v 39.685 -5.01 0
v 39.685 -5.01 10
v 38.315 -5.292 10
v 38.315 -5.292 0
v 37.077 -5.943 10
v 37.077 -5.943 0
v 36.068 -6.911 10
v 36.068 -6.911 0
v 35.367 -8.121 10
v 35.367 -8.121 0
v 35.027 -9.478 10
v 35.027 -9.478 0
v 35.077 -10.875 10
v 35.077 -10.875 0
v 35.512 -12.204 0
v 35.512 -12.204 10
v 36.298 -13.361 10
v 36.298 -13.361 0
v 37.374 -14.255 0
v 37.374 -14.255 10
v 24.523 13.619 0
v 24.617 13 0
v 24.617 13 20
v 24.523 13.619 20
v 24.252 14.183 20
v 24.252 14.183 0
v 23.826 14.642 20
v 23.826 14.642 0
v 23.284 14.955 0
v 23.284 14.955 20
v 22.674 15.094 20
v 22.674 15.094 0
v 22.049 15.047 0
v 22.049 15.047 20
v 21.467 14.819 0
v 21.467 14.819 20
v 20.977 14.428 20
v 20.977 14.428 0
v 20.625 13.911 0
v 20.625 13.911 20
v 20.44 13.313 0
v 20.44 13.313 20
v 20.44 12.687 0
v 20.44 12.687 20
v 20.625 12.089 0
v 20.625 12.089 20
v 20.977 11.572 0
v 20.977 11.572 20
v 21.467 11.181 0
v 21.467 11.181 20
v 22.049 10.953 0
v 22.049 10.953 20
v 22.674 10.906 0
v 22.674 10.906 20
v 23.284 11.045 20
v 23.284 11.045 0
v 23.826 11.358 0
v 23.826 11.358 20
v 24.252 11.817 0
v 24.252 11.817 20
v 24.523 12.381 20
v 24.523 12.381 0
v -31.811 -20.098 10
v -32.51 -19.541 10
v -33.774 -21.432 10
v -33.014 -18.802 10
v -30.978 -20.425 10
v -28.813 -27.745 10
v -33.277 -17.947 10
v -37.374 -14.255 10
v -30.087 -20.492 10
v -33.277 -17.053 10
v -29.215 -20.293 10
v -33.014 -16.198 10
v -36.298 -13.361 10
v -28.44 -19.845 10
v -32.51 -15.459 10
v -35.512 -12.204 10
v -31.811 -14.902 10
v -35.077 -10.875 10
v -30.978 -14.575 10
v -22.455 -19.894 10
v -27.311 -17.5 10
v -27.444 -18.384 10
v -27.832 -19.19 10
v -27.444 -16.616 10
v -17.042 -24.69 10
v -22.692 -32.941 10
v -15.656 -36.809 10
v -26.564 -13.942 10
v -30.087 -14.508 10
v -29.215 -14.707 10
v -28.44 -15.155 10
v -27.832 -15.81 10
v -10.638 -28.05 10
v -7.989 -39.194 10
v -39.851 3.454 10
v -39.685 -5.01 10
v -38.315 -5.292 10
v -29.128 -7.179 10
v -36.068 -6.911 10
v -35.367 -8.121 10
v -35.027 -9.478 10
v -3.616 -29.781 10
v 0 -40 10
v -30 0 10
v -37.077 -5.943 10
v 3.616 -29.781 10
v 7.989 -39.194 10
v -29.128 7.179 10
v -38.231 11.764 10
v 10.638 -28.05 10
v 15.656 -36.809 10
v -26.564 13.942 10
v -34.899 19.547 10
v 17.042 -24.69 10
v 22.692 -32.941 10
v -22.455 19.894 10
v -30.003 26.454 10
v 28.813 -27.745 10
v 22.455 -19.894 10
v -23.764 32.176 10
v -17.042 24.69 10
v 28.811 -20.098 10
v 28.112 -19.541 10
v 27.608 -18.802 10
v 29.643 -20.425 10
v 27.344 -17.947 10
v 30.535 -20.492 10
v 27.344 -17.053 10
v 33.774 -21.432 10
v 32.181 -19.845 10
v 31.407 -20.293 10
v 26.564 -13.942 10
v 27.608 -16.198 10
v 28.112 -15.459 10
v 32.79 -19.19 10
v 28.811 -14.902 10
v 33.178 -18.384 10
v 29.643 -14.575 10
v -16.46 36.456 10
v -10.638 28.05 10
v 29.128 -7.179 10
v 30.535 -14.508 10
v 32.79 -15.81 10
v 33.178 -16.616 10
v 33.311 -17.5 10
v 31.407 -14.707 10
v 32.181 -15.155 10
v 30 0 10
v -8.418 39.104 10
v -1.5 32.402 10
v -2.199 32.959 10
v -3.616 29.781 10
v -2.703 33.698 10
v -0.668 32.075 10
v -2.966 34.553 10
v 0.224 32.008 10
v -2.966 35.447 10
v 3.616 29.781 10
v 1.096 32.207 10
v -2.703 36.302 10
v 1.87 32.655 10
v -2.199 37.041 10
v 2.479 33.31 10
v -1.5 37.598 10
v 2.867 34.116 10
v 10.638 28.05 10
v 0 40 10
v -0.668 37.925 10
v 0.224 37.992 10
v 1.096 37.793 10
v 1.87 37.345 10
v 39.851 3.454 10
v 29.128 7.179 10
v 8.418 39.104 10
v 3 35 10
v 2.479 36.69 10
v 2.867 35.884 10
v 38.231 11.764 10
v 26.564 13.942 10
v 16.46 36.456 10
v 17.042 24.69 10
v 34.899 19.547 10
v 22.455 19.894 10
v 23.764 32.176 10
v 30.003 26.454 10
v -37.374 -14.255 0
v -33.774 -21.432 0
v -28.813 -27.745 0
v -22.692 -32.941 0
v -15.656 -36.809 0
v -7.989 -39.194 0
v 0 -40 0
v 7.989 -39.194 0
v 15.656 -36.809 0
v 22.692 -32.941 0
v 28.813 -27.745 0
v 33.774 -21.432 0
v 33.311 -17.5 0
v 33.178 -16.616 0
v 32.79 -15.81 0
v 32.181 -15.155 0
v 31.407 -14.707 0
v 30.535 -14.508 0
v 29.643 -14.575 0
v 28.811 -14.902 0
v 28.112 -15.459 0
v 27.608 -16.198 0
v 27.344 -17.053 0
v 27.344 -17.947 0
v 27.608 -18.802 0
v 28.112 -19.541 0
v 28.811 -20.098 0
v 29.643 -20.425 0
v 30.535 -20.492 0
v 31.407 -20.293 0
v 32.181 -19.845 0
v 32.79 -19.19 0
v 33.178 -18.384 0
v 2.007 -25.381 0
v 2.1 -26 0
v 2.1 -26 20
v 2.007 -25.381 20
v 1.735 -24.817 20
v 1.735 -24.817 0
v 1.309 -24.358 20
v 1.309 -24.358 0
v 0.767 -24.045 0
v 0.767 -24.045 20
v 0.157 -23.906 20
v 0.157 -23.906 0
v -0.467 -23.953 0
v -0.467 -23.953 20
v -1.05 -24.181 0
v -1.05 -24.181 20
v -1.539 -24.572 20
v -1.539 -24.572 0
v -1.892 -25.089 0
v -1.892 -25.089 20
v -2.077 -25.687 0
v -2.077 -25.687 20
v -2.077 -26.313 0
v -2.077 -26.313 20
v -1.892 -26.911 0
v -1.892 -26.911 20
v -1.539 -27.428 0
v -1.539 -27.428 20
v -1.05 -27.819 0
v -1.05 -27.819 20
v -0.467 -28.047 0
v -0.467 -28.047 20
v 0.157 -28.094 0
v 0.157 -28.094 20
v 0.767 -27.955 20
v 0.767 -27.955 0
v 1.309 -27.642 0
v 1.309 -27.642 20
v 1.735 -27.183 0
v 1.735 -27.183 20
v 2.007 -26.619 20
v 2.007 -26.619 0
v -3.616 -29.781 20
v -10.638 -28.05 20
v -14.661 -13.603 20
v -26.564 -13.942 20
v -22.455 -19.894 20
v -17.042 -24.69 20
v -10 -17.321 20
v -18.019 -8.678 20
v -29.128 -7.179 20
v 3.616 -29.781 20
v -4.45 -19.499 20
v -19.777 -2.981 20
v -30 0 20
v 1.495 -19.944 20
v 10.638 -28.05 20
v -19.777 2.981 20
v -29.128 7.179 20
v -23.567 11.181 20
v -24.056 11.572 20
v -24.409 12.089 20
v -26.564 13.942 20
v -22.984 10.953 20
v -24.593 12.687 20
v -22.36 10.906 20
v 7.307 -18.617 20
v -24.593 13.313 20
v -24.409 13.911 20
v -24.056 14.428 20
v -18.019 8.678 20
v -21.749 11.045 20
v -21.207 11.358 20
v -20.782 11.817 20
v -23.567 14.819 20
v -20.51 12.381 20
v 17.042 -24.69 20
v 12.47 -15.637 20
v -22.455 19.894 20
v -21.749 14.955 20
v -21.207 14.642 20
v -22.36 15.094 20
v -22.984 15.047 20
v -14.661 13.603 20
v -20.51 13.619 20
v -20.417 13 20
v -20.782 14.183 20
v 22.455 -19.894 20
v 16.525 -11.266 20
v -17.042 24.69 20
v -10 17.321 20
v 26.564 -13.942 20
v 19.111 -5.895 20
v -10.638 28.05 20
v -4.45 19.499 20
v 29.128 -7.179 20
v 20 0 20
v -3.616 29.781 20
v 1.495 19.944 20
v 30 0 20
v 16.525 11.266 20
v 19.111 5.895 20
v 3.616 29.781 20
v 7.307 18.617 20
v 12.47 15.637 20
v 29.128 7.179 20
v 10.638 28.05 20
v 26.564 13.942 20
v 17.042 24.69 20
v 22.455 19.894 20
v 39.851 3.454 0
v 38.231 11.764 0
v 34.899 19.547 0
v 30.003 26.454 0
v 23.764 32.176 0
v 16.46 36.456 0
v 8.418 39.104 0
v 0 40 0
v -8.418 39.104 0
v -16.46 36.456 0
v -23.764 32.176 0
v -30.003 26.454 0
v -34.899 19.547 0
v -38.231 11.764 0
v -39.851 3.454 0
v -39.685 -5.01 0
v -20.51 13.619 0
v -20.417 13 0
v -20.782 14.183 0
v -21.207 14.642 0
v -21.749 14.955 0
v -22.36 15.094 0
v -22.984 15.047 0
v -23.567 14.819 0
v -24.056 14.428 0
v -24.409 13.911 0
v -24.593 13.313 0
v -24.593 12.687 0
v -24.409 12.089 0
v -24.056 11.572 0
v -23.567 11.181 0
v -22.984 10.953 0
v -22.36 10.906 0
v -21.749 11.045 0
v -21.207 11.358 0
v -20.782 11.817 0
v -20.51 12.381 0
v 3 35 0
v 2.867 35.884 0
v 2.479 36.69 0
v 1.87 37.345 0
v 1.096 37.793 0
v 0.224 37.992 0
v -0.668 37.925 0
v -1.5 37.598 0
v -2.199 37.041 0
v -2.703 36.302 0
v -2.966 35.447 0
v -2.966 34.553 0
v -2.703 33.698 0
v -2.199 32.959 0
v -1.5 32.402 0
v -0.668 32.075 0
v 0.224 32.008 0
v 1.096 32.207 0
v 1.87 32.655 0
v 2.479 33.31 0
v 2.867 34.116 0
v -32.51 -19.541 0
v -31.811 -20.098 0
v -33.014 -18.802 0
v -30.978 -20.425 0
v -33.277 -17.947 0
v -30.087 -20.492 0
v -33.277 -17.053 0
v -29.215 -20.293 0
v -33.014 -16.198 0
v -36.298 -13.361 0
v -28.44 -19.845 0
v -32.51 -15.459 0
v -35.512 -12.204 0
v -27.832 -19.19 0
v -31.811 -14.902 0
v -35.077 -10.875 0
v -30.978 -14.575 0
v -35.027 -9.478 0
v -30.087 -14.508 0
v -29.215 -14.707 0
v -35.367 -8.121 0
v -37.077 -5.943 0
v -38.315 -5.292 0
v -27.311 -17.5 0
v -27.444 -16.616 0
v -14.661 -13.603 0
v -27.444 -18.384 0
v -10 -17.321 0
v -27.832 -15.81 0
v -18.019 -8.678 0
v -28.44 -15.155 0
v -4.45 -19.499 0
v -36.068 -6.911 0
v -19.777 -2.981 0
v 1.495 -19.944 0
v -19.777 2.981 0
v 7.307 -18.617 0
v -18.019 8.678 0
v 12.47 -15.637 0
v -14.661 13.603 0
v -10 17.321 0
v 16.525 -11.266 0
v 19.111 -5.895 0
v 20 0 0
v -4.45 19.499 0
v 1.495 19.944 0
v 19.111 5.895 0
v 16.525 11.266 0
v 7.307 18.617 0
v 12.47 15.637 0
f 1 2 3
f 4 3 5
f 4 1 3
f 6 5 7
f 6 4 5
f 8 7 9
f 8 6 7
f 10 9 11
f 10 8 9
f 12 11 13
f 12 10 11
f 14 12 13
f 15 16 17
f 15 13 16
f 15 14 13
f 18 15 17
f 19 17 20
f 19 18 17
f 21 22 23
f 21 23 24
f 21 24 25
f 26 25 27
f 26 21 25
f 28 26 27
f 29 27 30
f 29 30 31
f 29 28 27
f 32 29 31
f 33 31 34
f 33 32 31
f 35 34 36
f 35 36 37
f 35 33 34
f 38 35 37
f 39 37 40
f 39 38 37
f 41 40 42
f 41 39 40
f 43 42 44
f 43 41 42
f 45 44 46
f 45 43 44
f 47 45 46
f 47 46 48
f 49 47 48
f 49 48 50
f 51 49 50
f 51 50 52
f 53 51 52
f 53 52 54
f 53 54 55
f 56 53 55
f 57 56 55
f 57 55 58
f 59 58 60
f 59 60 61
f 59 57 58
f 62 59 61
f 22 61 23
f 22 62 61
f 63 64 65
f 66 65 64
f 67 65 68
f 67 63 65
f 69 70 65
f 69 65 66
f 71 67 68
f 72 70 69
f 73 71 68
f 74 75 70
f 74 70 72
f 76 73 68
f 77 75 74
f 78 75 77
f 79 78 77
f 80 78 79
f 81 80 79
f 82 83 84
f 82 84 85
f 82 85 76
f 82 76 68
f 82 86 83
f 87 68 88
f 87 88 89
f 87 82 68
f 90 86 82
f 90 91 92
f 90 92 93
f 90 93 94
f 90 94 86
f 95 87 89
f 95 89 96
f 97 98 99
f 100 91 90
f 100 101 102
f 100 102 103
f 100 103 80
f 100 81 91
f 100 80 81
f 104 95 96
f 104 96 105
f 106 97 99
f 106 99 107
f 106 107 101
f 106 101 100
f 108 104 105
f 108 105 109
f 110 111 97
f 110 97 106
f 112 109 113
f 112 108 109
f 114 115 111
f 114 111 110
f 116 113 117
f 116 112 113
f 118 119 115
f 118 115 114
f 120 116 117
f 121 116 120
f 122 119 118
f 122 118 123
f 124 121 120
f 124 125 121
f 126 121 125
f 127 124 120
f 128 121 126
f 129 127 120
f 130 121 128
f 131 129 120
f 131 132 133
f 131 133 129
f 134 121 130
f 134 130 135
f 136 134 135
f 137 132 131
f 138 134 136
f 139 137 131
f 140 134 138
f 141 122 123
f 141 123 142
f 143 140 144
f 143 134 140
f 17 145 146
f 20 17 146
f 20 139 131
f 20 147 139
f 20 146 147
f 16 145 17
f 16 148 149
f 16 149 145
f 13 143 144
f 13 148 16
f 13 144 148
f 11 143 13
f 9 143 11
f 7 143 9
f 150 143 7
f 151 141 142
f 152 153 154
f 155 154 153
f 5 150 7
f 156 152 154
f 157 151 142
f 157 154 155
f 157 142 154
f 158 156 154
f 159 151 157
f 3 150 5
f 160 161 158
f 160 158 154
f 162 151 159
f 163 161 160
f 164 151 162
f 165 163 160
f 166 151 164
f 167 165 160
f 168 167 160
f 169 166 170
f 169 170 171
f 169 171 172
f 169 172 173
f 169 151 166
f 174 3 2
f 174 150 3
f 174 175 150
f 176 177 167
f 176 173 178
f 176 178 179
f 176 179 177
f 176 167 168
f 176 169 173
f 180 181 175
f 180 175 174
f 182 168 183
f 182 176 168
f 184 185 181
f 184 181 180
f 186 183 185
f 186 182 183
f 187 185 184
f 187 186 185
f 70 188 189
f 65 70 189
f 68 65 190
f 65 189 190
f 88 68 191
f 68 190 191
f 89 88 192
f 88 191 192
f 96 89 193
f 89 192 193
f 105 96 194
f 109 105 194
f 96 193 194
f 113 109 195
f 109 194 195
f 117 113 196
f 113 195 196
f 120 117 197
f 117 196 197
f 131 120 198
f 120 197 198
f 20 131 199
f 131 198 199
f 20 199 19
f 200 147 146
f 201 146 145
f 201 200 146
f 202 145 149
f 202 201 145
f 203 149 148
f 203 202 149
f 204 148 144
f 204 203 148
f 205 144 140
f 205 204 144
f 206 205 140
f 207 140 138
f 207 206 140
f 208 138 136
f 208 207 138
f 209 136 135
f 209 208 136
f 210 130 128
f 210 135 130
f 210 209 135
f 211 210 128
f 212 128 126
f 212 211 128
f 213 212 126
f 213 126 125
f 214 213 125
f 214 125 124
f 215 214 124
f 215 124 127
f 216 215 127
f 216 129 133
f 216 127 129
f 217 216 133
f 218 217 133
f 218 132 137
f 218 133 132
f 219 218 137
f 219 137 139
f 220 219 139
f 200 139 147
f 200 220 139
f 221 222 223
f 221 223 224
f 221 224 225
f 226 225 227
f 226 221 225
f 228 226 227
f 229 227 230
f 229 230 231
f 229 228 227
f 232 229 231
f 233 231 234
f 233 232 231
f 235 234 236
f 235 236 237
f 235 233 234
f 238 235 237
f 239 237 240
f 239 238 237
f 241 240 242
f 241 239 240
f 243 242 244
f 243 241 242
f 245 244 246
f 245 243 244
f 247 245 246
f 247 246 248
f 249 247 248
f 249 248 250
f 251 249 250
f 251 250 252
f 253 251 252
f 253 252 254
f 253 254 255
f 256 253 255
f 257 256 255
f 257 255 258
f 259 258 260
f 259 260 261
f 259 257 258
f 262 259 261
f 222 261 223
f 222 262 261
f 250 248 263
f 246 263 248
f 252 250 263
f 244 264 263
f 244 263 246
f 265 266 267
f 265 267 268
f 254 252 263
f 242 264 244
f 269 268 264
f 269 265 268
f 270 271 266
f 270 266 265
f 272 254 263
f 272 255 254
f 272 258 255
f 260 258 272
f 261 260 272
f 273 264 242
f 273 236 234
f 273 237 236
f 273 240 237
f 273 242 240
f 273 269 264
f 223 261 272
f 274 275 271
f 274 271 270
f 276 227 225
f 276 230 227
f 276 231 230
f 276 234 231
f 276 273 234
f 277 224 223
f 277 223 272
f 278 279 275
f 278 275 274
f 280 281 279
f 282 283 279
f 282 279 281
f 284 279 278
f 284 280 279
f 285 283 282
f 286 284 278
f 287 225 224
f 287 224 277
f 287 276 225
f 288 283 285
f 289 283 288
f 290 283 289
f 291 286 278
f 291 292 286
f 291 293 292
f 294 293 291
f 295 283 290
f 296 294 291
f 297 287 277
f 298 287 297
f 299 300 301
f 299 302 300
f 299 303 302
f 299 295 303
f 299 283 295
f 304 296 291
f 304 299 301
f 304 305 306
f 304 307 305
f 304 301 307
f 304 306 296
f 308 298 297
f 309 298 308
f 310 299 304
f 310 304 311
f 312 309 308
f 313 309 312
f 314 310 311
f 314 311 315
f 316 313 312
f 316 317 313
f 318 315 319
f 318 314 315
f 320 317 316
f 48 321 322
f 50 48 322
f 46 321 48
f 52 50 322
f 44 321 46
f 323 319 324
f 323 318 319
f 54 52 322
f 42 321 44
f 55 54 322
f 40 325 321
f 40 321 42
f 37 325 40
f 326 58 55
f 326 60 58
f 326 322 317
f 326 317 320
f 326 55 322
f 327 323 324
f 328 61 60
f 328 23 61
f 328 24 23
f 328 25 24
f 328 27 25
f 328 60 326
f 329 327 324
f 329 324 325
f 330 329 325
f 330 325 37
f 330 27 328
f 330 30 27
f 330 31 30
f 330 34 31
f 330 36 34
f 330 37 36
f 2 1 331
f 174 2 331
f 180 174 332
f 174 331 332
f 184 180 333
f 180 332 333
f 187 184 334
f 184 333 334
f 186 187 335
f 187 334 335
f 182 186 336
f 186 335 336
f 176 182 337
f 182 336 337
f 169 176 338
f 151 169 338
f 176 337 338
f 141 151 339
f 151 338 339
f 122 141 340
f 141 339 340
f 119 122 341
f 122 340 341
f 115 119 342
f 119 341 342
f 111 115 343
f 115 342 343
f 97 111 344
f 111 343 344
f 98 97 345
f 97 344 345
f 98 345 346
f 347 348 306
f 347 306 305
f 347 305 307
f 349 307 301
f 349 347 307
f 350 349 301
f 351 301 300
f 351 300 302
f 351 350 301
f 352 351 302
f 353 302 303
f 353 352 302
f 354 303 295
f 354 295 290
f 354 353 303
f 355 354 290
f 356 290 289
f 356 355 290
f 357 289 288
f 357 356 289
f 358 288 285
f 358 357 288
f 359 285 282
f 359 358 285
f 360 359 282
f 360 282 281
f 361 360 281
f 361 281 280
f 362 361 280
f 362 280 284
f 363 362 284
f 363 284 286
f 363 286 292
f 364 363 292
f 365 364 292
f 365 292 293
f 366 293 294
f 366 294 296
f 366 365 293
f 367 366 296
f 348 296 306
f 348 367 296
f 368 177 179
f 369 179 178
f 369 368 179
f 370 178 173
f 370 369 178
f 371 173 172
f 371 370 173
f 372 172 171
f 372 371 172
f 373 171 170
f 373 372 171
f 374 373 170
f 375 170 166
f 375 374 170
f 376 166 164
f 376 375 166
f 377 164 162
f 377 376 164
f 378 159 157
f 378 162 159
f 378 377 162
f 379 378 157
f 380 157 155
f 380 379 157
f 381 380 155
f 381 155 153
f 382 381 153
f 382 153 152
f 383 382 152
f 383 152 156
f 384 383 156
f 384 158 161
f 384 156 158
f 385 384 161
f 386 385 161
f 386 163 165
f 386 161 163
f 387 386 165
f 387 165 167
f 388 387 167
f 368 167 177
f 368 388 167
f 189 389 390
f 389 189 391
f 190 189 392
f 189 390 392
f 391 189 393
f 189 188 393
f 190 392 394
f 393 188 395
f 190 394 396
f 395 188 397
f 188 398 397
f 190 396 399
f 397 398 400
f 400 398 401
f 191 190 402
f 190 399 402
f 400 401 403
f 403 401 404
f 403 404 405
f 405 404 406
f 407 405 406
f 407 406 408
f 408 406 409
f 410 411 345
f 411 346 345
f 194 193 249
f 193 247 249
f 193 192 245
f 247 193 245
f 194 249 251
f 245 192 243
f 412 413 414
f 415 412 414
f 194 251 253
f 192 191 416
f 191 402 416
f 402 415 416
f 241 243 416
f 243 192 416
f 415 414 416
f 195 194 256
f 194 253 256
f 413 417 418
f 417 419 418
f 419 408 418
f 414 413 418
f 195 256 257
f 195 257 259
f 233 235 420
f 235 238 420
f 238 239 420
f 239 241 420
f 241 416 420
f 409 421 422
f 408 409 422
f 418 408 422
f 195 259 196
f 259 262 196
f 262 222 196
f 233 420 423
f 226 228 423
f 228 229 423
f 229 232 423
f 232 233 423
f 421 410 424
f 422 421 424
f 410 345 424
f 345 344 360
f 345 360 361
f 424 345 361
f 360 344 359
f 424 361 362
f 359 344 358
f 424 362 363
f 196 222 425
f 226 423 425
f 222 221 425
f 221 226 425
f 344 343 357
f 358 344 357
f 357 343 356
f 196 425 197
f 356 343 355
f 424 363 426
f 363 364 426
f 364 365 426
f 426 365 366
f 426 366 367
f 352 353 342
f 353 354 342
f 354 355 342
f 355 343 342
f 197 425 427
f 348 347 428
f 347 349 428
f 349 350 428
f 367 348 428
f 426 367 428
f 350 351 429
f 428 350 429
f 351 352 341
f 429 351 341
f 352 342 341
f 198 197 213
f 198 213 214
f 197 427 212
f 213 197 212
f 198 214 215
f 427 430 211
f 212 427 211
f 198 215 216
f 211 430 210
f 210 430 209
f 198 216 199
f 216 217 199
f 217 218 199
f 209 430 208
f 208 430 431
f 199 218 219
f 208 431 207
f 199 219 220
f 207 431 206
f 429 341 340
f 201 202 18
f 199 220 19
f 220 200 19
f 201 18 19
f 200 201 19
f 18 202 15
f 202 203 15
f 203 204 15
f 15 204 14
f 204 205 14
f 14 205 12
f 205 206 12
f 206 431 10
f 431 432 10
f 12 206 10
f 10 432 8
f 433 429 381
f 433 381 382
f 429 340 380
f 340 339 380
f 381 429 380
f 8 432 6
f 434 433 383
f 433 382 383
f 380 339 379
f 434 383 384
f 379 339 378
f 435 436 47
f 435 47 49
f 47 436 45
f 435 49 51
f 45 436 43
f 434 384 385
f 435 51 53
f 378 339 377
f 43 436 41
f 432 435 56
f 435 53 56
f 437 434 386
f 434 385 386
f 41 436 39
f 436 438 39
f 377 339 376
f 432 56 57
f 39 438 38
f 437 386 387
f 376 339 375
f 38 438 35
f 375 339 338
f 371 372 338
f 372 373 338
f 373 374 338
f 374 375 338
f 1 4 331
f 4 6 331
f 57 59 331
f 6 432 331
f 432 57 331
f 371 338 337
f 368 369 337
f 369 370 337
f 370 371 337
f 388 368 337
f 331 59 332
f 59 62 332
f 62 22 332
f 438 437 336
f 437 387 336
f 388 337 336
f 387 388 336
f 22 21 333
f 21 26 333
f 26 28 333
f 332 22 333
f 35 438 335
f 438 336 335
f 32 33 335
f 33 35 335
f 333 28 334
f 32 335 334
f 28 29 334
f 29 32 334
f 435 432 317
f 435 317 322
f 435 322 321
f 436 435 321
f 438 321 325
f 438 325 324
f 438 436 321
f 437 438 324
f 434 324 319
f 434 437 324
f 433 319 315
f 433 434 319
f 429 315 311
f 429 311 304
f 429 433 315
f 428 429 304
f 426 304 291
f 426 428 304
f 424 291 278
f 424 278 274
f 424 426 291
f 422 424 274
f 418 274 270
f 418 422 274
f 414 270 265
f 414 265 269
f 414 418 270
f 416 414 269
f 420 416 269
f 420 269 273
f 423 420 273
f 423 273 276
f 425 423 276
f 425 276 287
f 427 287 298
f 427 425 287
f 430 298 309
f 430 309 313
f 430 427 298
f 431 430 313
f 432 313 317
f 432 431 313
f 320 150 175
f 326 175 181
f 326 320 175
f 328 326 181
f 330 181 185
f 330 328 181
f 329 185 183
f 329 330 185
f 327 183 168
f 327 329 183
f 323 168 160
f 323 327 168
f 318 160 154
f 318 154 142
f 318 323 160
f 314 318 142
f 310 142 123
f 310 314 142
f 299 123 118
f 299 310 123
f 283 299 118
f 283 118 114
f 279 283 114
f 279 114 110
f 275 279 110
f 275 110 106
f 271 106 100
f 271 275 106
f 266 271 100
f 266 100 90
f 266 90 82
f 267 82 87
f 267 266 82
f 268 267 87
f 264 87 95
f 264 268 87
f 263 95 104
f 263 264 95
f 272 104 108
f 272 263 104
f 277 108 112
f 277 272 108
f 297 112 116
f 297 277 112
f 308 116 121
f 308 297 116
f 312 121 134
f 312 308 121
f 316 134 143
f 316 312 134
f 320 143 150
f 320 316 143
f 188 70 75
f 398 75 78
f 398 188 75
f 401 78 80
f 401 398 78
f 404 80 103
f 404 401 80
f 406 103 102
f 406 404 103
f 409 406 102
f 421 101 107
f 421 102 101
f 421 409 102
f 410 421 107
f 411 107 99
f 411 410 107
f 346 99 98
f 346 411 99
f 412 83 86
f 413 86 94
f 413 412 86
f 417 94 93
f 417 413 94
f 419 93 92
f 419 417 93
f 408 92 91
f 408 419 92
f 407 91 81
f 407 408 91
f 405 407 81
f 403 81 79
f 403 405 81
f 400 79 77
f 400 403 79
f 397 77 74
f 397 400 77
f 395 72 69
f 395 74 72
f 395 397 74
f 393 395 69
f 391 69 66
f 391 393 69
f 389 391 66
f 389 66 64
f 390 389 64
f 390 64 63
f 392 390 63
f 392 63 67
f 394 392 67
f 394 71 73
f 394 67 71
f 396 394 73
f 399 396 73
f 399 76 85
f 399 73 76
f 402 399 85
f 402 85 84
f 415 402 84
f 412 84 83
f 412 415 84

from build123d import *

# Parameters (mm, degrees)
SKETCH_R      = 3
SKETCH_R_2    = 2.1
SKETCH_R_3    = 20
PAD_DEPTH     = 20
SKETCH001_R   = 40
SKETCH001_R_2 = 30
POCKET_DEPTH  = 10


with BuildPart() as part:
    # Sketch → Pad (new body)
    with BuildSketch(Plane.XY):
        with BuildLine():
            ThreePointArc((-37.373806, -14.254775), (0, -40), (37.373806, -14.254775))
            ThreePointArc((39.685017, -5.009931), (35.149287, -8.787322), (37.373806, -14.254775))
            ThreePointArc((39.685017, -5.009931), (0, 40), (-39.685017, -5.009931))
            ThreePointArc((-37.373806, -14.254775), (-35.149287, -8.787322), (-39.685017, -5.009931))
        make_face()
        with Locations((0, 35)):
            Circle(SKETCH_R, mode=Mode.SUBTRACT)
        with Locations((-30.310889, -17.5)):
            Circle(SKETCH_R, mode=Mode.SUBTRACT)
        with Locations((30.310889, -17.5)):
            Circle(SKETCH_R, mode=Mode.SUBTRACT)
        with Locations((-22.51666, 13)):
            Circle(SKETCH_R_2, mode=Mode.SUBTRACT)
        with Locations((22.51666, 13)):
            Circle(SKETCH_R_2, mode=Mode.SUBTRACT)
        with Locations((0, -26)):
            Circle(SKETCH_R_2, mode=Mode.SUBTRACT)
        Circle(SKETCH_R_3, mode=Mode.SUBTRACT)
    extrude(amount=PAD_DEPTH)

    # Sketch001 (on Face13 of Pad) → Pocket (cut)
    with BuildSketch(Plane.XY.offset(20)):
        Circle(SKETCH001_R)
        Circle(SKETCH001_R_2, mode=Mode.SUBTRACT)
    extrude(amount=-POCKET_DEPTH, mode=Mode.SUBTRACT)


solid = part.part
